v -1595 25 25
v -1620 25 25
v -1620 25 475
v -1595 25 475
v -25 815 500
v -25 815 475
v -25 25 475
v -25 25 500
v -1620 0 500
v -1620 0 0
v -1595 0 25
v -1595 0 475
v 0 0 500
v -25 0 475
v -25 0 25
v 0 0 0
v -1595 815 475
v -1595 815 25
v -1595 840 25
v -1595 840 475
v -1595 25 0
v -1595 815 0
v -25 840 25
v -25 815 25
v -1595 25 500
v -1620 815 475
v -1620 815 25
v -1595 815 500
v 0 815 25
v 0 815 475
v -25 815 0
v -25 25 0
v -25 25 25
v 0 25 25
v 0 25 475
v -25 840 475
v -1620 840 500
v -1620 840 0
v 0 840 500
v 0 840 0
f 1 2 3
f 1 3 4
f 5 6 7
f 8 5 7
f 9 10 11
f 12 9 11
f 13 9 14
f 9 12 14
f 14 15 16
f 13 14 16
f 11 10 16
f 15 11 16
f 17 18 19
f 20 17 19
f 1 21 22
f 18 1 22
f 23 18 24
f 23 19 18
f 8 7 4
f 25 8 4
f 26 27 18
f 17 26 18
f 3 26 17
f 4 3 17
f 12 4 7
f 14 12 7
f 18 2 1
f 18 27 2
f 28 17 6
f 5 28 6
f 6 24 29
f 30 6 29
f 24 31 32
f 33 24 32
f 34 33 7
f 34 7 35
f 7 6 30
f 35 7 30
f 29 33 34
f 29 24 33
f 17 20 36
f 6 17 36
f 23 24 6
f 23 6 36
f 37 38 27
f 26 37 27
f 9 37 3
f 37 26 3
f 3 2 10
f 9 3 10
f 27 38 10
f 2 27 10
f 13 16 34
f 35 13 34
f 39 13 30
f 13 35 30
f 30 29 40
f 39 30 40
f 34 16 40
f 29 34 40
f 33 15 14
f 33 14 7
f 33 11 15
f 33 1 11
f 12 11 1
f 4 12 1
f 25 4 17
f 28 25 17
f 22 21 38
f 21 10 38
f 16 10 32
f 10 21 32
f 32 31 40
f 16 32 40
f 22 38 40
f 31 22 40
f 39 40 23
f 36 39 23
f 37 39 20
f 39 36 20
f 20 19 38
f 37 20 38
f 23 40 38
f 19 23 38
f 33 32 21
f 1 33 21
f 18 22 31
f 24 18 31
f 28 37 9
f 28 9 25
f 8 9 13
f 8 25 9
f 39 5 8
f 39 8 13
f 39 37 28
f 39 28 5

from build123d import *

# Parameters (mm, degrees)
F1_DEPTH = 25
F2_W     = 25
F2_H     = 25
F3_DEPTH = 450
F5_DEPTH = 25


with BuildPart() as f1:
    # F0 (on Top) → F1 (new body)
    with BuildSketch(Plane.XY):
        Polygon((-25, 25), (0, 0), (0, 840), (-25, 815), (-25, 420), align=None)
        Polygon((-1620, 0), (0, 0), (-25, 25), (-810, 25), (-1595, 25), align=None)
        Polygon((-1620, 840), (-1620, 0), (-1595, 25), (-1595, 420), (-1595, 815), align=None)
        Polygon((-25, 815), (0, 840), (-1620, 840), (-1595, 815), (-810, 815), align=None)
    extrude(amount=F1_DEPTH)

    # F2 (on face) → F3 (join)
    with BuildSketch(Plane.XY.offset(25)):
        with Locations((-1607.5, 12.5)):
            Rectangle(F2_W, F2_H)
        with Locations((-1607.5, 827.5)):
            Rectangle(F2_W, F2_H)
        with Locations((-12.5, 12.5)):
            Rectangle(F2_W, F2_H)
        with Locations((-12.5, 827.5)):
            Rectangle(F2_W, F2_H)
    extrude(amount=F3_DEPTH)

    # F4 (on face) → F5 (join)
    with BuildSketch(Plane.XY.offset(475)):
        Polygon((-25, 815), (0, 840), (-1620, 840), (-1595, 815), (-810, 815), align=None)
        Polygon((0, 0), (0, 840), (-25, 815), (-25, 420), (-25, 25), align=None)
        Polygon((-1595, 815), (-1620, 840), (-1620, 0), (-1595, 25), (-1595, 420), align=None)
        Polygon((-1620, 0), (0, 0), (-25, 25), (-810, 25), (-1595, 25), align=None)
    extrude(amount=F5_DEPTH)


solid = f1.part
